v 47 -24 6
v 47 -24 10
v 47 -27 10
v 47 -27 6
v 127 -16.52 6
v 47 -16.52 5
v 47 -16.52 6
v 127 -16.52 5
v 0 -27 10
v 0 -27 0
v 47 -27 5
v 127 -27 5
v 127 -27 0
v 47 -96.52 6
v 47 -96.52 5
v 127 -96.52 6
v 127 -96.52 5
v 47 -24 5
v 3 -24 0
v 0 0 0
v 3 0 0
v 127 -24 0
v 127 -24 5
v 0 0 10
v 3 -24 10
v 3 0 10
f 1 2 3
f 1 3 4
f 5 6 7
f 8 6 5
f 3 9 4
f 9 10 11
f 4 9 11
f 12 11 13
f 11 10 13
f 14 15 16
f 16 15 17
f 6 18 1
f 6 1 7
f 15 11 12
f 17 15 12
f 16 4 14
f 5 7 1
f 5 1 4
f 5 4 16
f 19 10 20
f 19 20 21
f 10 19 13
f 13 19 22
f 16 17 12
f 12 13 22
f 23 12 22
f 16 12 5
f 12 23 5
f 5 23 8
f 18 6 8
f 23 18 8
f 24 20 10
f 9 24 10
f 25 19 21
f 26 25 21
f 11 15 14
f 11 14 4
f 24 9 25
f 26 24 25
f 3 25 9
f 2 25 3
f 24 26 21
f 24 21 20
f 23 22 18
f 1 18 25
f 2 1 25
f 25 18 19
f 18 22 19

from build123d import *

# Parameters (mm, degrees)
BOSS_EXTRUDE1_DEPTH = 10
SKETCH4_W           = 80
SKETCH4_H           = 5
CUT_EXTRUDE1_DEPTH  = 6
SKETCH5_W           = 80
SKETCH5_H           = 80
BOSS_EXTRUDE3_DEPTH = 1


with BuildPart() as part:
    # Sketch1 → Boss-Extrude1 (new body)
    with BuildSketch(Plane.XY):
        Polygon((0, 0), (0, -27), (127, -27), (127, -24), (3, -24), (3, 0), align=None)
    extrude(amount=BOSS_EXTRUDE1_DEPTH)

    # Sketch4 → Cut-Extrude1 (cut)
    with BuildSketch(Plane(origin=(0, -24, 0), x_dir=(1, 0, 0), z_dir=(0, 1, 0))):
        with Locations((87, -7.5)):
            Rectangle(SKETCH4_W, SKETCH4_H)
    extrude(amount=-CUT_EXTRUDE1_DEPTH, mode=Mode.SUBTRACT)

    # Sketch5 → Boss-Extrude3 (add)
    with BuildSketch(Plane.XY.offset(5)):
        with Locations((87, -56.52)):
            Rectangle(SKETCH5_W, SKETCH5_H)
    extrude(amount=BOSS_EXTRUDE3_DEPTH)


solid = part.part
